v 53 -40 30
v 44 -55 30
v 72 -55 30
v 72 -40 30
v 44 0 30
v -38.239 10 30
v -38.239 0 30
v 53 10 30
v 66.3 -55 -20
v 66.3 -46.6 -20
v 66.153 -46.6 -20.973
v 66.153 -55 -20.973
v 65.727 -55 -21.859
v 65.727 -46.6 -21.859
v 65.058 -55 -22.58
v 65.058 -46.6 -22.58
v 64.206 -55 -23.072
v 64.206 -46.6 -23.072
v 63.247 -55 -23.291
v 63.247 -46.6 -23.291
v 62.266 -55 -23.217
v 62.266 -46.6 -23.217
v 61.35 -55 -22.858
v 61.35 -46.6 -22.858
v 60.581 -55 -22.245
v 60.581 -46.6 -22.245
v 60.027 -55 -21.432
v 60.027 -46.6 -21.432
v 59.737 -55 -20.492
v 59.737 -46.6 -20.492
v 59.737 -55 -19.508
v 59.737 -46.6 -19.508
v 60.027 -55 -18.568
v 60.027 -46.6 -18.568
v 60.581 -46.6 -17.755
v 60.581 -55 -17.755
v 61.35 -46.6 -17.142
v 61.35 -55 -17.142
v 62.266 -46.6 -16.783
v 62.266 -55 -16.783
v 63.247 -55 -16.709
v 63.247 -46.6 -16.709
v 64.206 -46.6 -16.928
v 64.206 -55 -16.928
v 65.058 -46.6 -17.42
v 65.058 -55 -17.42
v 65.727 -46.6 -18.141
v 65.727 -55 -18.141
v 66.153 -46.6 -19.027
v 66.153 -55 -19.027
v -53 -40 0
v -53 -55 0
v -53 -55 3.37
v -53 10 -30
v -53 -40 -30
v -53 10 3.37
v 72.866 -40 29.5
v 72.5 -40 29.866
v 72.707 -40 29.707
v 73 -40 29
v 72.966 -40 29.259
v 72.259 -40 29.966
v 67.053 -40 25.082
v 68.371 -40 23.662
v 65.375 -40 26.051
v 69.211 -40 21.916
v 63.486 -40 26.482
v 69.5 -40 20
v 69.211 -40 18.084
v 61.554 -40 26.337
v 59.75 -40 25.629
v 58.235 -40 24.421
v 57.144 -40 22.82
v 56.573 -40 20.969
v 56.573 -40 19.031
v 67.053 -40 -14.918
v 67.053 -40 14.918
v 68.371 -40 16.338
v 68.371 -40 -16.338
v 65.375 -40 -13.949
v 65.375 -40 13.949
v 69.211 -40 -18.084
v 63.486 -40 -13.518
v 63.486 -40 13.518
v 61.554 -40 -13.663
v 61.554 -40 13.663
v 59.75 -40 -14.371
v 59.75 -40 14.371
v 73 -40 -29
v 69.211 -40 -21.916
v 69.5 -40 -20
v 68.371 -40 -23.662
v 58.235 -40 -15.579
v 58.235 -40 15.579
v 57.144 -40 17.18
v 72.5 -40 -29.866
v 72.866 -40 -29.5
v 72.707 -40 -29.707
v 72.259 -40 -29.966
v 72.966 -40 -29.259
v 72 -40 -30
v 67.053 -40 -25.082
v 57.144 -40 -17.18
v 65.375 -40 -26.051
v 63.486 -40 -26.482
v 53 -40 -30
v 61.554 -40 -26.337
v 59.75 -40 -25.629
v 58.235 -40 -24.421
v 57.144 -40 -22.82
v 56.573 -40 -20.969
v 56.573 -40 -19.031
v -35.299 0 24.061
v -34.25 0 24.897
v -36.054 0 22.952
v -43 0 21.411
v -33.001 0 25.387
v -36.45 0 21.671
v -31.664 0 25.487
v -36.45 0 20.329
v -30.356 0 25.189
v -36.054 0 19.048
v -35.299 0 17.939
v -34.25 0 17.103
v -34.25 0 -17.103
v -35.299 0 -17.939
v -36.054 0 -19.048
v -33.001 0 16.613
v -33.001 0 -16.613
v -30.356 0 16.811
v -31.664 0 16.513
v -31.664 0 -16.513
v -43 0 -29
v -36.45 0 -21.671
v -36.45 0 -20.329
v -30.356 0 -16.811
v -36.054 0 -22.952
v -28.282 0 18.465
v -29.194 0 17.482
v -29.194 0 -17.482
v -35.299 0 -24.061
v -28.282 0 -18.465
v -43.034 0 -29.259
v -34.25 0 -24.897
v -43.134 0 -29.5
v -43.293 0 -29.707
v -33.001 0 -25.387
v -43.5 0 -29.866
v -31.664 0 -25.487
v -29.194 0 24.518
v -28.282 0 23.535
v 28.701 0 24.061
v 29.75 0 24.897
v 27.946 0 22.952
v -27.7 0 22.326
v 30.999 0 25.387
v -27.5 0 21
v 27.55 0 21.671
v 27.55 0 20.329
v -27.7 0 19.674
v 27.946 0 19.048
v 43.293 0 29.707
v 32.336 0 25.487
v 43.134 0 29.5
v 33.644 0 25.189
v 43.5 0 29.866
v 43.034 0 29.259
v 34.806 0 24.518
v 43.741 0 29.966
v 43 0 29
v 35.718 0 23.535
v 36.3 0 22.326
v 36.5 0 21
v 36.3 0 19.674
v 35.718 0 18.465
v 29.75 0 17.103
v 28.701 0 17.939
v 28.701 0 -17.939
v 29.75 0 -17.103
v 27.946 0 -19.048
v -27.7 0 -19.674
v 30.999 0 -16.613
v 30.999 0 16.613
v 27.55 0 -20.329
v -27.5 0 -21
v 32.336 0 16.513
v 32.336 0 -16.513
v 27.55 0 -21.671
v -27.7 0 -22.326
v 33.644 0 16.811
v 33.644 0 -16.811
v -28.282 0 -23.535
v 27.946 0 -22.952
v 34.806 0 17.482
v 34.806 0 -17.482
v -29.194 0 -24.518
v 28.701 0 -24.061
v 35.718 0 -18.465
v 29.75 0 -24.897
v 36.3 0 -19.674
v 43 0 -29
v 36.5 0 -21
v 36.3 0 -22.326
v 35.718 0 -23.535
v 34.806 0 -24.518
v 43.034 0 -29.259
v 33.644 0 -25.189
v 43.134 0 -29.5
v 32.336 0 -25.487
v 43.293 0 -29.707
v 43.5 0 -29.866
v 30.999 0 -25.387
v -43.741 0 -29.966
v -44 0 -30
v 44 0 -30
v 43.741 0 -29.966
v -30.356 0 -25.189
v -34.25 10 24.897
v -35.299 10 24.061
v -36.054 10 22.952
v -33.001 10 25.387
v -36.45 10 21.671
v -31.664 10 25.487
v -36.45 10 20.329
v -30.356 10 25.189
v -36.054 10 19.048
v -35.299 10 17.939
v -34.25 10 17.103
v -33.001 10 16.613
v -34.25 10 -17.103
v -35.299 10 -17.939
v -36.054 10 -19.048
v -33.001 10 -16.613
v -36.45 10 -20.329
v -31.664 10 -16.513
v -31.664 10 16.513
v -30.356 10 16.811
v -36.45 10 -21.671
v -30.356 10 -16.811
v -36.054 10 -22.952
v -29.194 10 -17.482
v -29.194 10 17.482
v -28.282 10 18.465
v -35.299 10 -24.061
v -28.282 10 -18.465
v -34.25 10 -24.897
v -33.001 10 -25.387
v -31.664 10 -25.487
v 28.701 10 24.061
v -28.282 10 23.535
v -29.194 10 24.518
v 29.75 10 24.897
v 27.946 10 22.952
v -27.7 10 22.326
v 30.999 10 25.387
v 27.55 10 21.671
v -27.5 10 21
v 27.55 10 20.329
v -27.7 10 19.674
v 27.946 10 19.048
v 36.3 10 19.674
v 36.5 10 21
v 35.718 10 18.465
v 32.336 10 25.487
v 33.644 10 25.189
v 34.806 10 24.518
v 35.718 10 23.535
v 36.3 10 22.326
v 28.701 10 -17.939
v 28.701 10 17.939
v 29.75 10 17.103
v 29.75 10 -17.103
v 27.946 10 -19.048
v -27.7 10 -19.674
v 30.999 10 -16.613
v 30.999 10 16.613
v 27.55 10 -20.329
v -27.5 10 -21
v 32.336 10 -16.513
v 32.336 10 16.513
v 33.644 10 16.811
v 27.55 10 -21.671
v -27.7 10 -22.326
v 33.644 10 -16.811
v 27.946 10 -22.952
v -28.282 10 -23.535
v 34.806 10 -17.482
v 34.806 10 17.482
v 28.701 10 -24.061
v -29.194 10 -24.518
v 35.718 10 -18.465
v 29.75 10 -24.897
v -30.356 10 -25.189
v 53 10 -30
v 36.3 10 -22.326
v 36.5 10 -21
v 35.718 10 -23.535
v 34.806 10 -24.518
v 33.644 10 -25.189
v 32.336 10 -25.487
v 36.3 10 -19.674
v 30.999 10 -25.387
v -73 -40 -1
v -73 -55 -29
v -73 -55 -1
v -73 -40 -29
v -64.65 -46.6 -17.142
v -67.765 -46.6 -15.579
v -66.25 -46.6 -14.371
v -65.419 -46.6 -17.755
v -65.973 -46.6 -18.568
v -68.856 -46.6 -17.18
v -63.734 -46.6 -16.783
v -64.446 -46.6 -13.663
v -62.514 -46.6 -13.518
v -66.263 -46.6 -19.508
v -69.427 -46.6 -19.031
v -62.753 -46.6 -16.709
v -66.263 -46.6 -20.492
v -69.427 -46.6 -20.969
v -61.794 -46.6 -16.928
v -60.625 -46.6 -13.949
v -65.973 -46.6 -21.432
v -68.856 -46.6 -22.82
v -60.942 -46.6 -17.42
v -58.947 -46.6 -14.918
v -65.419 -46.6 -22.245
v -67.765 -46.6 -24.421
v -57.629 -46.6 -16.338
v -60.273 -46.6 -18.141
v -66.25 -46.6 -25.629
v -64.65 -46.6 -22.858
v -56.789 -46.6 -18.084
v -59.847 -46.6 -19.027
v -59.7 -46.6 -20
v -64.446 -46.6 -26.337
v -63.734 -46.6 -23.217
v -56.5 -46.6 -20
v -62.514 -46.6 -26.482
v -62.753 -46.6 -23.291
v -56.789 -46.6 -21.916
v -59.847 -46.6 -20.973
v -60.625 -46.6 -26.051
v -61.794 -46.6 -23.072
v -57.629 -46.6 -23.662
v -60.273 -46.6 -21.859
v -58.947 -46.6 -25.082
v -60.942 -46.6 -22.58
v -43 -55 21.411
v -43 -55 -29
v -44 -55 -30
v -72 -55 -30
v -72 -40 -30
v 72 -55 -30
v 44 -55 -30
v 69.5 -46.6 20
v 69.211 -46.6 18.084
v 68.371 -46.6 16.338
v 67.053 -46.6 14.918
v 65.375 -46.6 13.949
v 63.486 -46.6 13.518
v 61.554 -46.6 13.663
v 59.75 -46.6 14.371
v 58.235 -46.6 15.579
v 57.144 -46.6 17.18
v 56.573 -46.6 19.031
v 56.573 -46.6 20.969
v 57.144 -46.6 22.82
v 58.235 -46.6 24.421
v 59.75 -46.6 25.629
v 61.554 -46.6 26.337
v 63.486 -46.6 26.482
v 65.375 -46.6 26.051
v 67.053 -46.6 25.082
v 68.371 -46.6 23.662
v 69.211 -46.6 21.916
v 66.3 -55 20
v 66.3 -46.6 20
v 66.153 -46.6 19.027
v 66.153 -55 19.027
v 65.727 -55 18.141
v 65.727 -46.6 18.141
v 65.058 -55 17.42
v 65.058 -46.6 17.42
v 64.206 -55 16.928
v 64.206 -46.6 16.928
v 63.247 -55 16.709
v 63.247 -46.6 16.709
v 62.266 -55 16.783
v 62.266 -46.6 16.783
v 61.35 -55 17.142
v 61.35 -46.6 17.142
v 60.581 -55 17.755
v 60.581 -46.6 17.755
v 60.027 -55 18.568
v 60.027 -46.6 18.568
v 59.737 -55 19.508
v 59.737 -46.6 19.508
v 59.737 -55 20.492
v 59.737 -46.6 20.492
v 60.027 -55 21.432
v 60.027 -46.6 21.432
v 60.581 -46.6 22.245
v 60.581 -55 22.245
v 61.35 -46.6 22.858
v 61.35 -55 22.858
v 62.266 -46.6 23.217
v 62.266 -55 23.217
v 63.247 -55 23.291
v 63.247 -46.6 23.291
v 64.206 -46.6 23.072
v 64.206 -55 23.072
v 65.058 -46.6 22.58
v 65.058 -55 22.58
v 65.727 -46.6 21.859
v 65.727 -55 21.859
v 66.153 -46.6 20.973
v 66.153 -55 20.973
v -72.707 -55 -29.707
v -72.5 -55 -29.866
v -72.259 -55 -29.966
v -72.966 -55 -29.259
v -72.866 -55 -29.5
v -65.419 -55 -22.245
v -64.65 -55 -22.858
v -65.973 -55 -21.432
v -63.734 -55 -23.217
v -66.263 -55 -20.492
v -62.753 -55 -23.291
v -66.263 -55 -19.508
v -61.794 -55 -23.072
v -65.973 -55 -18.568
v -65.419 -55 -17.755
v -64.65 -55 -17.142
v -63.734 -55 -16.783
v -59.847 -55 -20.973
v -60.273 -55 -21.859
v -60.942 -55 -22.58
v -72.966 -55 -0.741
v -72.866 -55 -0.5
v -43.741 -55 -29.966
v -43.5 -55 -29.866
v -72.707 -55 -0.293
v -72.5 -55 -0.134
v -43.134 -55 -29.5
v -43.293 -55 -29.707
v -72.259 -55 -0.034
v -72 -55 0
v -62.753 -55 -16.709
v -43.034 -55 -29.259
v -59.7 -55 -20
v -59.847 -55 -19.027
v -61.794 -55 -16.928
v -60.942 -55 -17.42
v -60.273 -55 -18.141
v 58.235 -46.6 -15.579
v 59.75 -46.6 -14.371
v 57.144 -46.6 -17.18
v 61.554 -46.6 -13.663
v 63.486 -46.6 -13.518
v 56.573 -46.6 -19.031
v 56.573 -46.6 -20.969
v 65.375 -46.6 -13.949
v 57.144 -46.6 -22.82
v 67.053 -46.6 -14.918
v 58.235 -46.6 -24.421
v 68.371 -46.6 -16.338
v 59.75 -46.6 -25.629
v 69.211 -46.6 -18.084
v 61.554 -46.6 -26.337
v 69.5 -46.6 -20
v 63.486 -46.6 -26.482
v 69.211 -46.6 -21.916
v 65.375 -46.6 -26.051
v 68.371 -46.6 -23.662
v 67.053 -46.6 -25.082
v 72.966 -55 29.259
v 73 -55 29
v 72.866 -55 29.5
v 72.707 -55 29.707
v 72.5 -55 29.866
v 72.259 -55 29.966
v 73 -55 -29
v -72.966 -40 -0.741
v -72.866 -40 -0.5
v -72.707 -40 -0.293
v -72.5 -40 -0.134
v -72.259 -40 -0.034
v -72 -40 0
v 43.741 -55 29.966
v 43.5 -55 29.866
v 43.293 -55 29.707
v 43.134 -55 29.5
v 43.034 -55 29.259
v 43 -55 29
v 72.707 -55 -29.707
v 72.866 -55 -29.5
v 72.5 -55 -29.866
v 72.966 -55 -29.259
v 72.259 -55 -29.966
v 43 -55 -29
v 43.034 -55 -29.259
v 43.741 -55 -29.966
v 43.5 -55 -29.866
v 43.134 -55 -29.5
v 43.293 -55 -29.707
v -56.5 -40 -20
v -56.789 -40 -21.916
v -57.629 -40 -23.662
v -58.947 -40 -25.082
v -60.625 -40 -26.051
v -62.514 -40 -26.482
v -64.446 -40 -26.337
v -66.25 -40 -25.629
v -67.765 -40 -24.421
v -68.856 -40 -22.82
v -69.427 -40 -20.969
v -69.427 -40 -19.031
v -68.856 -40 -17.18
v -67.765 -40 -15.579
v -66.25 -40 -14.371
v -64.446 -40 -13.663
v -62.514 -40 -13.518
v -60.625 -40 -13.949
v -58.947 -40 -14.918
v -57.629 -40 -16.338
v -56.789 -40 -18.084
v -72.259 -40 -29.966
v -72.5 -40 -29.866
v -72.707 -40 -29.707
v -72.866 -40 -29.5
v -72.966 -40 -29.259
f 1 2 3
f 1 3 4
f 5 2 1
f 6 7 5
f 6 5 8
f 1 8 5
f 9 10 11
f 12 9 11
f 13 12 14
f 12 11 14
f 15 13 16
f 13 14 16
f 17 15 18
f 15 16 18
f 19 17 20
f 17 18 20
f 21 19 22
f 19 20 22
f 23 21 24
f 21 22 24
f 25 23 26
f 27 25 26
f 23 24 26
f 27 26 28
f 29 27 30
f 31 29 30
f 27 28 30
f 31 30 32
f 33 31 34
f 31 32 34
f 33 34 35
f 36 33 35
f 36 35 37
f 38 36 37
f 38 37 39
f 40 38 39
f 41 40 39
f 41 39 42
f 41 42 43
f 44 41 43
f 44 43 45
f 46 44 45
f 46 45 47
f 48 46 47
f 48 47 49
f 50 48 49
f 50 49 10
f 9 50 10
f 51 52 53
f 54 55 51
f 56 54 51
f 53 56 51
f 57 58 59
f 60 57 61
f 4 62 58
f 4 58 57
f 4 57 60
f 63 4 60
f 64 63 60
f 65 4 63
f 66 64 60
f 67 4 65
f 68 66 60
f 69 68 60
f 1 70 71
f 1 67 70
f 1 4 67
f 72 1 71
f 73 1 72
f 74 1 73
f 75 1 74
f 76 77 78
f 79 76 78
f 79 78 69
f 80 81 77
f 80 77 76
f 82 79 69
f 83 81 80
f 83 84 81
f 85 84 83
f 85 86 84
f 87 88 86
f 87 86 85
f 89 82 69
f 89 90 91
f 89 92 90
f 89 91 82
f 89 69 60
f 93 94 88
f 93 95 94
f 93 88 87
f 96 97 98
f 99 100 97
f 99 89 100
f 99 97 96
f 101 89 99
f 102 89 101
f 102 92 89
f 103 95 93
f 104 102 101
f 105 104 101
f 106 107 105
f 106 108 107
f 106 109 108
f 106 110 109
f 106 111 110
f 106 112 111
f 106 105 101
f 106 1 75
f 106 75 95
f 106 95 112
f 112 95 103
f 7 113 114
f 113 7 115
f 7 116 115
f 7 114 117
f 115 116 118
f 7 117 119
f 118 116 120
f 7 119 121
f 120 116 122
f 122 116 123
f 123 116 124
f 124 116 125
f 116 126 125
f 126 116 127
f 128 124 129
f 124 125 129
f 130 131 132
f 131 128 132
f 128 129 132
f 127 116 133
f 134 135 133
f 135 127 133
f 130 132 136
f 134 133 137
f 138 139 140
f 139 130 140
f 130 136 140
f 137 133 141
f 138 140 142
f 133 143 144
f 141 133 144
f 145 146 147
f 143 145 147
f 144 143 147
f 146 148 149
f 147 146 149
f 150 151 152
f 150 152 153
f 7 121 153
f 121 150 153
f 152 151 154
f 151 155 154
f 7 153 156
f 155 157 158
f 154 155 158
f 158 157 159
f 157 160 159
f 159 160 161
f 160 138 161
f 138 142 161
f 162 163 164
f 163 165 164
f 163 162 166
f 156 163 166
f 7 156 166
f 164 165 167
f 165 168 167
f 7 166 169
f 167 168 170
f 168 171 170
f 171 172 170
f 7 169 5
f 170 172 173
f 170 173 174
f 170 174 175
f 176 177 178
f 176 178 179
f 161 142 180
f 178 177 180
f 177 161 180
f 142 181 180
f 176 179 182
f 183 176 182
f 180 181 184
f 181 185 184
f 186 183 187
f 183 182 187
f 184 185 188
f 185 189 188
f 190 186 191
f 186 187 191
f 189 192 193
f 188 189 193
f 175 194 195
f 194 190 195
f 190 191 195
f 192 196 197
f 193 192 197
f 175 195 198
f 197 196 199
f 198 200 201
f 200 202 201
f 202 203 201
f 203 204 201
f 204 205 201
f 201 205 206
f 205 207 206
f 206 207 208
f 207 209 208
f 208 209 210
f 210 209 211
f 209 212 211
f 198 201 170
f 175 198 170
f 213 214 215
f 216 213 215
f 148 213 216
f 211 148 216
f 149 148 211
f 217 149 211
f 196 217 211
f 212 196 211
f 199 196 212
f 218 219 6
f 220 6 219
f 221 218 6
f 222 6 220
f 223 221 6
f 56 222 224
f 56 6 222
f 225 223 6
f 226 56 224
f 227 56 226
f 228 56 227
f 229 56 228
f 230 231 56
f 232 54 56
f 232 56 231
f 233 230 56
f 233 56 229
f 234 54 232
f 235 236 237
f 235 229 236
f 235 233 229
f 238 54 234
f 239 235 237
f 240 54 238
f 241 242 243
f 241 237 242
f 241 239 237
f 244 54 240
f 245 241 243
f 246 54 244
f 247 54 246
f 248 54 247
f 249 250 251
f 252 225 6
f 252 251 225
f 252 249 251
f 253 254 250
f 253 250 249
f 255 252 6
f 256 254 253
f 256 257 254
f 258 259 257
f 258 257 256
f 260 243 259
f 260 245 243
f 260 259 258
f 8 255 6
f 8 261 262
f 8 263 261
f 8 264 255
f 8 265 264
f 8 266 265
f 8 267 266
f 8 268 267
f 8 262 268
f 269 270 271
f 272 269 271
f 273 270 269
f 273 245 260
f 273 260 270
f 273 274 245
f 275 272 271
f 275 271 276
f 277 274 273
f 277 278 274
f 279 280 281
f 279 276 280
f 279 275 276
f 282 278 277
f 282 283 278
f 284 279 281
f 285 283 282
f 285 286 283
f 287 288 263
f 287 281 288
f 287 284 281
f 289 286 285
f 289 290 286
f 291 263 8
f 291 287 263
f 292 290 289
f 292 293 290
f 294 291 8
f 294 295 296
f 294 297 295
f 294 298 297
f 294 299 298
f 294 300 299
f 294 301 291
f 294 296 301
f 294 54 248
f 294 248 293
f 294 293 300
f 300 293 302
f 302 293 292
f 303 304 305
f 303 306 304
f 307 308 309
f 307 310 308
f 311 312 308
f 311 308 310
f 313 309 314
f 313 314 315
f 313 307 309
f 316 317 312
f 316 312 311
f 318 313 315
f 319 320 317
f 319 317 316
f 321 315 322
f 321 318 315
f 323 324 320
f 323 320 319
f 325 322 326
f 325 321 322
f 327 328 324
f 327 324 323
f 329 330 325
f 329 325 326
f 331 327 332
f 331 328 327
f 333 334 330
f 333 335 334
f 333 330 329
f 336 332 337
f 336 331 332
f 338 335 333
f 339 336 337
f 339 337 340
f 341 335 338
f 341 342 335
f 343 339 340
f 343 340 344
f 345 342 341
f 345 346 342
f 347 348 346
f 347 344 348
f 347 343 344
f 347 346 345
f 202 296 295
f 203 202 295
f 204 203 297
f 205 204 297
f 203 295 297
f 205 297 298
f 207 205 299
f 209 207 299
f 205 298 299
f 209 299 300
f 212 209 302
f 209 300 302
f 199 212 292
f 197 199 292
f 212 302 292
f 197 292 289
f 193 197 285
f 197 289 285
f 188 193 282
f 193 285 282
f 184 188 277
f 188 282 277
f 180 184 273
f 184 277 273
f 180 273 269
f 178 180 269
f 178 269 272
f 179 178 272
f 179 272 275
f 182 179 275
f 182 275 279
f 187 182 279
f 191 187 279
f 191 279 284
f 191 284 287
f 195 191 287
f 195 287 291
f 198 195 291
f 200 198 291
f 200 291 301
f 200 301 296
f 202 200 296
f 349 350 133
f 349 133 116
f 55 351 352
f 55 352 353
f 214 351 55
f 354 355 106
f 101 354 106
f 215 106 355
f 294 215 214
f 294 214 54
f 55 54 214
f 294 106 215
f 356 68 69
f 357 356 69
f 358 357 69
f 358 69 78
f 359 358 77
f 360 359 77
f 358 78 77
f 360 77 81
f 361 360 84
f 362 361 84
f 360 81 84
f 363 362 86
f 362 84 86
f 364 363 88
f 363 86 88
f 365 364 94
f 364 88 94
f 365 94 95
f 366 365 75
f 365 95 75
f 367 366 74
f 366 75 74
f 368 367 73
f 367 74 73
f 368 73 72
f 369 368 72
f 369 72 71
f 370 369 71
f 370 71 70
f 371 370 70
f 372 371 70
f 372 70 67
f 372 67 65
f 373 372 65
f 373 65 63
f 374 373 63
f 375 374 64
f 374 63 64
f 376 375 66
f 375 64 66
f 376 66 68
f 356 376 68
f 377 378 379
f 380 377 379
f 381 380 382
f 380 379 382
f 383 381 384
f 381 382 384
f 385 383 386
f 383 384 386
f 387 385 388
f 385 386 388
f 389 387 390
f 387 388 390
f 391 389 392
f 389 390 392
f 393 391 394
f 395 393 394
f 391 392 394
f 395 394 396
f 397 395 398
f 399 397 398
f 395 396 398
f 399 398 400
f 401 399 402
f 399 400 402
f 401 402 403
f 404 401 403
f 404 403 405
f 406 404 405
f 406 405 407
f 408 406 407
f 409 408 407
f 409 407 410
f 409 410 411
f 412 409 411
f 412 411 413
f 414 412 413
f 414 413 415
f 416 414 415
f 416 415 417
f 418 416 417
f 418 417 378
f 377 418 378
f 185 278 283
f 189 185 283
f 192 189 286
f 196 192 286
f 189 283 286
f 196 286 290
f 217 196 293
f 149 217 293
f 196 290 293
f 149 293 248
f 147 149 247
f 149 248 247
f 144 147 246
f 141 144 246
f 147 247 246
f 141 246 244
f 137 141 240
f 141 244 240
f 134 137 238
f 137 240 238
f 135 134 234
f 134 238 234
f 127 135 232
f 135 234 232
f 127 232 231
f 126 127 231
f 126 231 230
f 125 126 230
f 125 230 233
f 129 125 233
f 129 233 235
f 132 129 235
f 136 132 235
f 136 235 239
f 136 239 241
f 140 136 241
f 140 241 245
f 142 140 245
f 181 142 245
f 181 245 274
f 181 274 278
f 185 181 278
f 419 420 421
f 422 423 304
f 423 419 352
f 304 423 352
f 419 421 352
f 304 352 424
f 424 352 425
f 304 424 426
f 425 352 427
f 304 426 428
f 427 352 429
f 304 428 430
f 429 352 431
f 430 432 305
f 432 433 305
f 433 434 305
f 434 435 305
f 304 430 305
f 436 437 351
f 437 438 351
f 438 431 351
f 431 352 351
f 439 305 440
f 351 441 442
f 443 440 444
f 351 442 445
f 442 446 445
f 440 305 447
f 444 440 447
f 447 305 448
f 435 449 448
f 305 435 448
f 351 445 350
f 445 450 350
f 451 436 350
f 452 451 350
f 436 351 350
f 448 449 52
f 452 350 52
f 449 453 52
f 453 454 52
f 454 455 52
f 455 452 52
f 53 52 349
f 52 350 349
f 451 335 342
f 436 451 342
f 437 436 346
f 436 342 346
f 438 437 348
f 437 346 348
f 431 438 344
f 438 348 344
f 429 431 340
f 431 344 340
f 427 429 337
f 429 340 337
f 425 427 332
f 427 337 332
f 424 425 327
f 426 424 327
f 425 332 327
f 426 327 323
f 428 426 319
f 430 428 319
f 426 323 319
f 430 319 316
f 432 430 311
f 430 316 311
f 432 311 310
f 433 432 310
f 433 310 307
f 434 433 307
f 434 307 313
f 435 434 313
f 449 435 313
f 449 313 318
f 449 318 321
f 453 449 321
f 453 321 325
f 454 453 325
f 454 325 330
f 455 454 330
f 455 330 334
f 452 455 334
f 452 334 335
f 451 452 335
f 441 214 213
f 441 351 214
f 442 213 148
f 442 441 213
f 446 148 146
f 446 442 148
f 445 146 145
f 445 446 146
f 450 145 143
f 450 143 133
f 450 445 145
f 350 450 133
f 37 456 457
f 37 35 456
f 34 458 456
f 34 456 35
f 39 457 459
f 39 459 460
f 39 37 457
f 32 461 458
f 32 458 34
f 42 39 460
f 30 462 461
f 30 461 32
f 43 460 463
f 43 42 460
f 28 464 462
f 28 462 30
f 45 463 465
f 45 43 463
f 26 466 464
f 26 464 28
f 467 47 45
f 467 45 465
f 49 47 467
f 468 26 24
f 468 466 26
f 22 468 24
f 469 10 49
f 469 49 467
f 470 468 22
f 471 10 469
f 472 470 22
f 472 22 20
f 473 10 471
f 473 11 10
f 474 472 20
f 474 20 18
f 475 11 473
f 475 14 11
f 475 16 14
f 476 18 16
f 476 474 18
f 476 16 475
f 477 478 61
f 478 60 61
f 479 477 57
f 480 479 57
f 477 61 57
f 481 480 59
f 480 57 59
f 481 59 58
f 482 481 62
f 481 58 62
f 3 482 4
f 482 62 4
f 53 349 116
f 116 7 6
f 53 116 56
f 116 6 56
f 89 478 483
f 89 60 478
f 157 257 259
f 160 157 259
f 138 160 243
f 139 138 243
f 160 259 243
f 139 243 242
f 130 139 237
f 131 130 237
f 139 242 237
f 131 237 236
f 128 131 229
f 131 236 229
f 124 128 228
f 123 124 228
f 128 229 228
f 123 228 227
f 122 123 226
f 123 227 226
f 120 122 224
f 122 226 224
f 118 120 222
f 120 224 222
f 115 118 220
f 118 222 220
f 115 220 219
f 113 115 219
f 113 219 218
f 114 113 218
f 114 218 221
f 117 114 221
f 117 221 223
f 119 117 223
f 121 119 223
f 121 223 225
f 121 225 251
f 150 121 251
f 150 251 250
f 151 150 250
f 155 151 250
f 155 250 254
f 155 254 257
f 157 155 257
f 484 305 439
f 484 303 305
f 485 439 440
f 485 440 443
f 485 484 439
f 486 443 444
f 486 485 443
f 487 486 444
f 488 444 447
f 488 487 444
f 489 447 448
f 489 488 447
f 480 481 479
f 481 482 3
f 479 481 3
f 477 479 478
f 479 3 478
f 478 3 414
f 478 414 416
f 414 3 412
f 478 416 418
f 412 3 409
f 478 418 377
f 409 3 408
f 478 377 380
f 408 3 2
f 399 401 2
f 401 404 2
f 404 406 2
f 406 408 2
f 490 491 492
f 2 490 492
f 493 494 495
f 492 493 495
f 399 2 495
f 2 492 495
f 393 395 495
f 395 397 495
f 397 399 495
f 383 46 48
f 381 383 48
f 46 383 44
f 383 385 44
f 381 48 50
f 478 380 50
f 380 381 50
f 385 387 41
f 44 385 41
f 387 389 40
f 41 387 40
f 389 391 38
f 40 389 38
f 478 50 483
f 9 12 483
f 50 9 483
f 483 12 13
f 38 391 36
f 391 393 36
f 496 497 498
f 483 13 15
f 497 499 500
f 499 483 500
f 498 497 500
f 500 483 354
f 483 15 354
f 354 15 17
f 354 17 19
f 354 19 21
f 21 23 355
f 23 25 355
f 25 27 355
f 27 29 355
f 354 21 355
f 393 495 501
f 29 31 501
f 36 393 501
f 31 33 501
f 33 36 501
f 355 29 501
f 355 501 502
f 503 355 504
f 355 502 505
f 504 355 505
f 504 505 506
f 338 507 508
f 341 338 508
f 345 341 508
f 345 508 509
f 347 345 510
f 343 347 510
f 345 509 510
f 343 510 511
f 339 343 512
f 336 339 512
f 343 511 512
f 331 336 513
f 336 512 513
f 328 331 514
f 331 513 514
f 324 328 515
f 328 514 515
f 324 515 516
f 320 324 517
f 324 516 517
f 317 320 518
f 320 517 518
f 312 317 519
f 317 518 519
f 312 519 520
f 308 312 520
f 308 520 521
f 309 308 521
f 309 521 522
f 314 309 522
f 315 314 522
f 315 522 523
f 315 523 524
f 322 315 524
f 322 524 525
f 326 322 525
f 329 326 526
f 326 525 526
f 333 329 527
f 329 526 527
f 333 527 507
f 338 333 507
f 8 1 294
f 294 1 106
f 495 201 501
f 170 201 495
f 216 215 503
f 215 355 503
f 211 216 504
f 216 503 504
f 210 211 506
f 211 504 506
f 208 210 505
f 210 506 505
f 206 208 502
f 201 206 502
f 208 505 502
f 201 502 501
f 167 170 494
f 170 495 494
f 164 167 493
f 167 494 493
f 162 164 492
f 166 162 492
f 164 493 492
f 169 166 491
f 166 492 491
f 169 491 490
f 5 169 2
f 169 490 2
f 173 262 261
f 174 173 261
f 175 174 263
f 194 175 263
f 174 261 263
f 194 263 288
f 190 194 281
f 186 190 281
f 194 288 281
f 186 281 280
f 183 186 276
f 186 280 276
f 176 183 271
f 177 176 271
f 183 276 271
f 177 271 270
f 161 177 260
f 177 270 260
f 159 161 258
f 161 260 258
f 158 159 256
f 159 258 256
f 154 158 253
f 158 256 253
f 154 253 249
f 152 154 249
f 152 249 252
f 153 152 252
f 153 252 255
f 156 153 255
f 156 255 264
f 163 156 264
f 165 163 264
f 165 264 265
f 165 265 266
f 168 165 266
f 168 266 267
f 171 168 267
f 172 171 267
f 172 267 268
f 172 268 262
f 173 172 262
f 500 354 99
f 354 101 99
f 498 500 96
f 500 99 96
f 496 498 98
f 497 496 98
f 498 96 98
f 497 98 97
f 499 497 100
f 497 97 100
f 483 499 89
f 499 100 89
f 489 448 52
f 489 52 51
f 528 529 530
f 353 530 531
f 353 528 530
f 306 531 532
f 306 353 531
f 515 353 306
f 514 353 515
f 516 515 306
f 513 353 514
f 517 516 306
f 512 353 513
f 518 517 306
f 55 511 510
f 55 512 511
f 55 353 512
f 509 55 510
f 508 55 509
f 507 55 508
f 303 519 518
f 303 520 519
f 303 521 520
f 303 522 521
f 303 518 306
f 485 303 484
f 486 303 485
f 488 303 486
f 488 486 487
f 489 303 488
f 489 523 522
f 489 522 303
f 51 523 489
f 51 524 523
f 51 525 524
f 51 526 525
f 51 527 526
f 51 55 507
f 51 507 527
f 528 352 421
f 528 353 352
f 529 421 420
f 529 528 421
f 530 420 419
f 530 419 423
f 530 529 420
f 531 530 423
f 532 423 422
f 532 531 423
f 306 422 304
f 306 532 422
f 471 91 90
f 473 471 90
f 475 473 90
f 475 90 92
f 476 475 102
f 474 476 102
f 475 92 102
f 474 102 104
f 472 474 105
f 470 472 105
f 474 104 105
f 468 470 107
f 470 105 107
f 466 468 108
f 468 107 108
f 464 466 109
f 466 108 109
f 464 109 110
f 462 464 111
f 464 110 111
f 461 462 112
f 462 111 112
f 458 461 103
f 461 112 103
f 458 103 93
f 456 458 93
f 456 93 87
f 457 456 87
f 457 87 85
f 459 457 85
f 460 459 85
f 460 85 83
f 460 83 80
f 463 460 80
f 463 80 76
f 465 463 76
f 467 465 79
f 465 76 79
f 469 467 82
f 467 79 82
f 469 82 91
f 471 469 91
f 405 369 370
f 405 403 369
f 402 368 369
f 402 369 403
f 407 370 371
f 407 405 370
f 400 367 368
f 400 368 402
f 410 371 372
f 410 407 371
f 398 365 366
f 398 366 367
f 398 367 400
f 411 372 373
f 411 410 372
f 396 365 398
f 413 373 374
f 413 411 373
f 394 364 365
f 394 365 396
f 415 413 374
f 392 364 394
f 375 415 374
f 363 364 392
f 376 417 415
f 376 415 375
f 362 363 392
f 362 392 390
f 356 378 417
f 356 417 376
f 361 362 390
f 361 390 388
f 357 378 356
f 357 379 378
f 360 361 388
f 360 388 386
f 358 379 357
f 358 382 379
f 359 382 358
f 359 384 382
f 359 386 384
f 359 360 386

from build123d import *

# Parameters (mm, degrees)
SKETCH1_W           = 106
SKETCH1_H           = 60
BOSS_EXTRUDE1_DEPTH = 10
SKETCH2_W           = 10
SKETCH2_H           = 60
BOSS_EXTRUDE2_DEPTH = 55
SKETCH3_W           = 60
SKETCH3_H           = 15
BOSS_EXTRUDE3_DEPTH = 20
SKETCH4_W           = 30
SKETCH4_H           = 15
BOSS_EXTRUDE4_DEPTH = 20
SKETCH5_R           = 4.5
CUT_EXTRUDE1_DEPTH  = 66
SKETCH6_R           = 6.5
CUT_EXTRUDE2_DEPTH  = 6.6
SKETCH7_R           = 3.3
CUT_EXTRUDE3_DEPTH  = 9.4
CUT_EXTRUDE4_DEPTH  = 66
FILLET1_R           = 1


with BuildPart() as part:
    # Sketch1 → Boss-Extrude1 (new body)
    with BuildSketch(Plane(origin=(0, 0, 0), x_dir=(1, 0, 0), z_dir=(0, 1, 0))):
        Rectangle(SKETCH1_W, SKETCH1_H)
    extrude(amount=BOSS_EXTRUDE1_DEPTH)

    # Sketch2 → Boss-Extrude2 (add)
    with BuildSketch(Plane.XZ):
        with Locations((-48, 0)):
            Rectangle(SKETCH2_W, SKETCH2_H)
        with Locations((48, 0)):
            Rectangle(SKETCH2_W, SKETCH2_H)
    extrude(amount=BOSS_EXTRUDE2_DEPTH)

    # Sketch3 → Boss-Extrude3 (add)
    with BuildSketch(Plane(origin=(53, 0, 0), x_dir=(0, 0, -1), z_dir=(1, 0, 0))):
        with Locations((0, -47.5)):
            Rectangle(SKETCH3_W, SKETCH3_H)
    extrude(amount=BOSS_EXTRUDE3_DEPTH)

    # Sketch4 → Boss-Extrude4 (add)
    with BuildSketch(Plane.ZY.offset(53)):
        with Locations((-15, -47.5)):
            Rectangle(SKETCH4_W, SKETCH4_H)
    extrude(amount=BOSS_EXTRUDE4_DEPTH)

    # Sketch5 → Cut-Extrude1 (cut, through all)
    with BuildSketch(Plane(origin=(0, 10, 0), x_dir=(1, 0, 0), z_dir=(0, 1, 0))):
        with Locations((-32, 21)):
            Circle(SKETCH5_R)
        with Locations((32, 21)):
            Circle(SKETCH5_R)
        with Locations((32, -21)):
            Circle(SKETCH5_R)
        with Locations((-32, -21)):
            Circle(SKETCH5_R)
    extrude(amount=-CUT_EXTRUDE1_DEPTH, mode=Mode.SUBTRACT)

    # Sketch6 → Cut-Extrude2 (cut)
    with BuildSketch(Plane(origin=(0, -40, 0), x_dir=(1, 0, 0), z_dir=(0, 1, 0))):
        with Locations((63, 20)):
            Circle(SKETCH6_R)
        with Locations((63, -20)):
            Circle(SKETCH6_R)
        with Locations((-63, 20)):
            Circle(SKETCH6_R)
    extrude(amount=-CUT_EXTRUDE2_DEPTH, mode=Mode.SUBTRACT)

    # Sketch7 → Cut-Extrude3 (cut, through all)
    with BuildSketch(Plane(origin=(0, -46.6, 0), x_dir=(1, 0, 0), z_dir=(0, 1, 0))):
        with Locations((-63, 20)):
            Circle(SKETCH7_R)
        with Locations((63, -20)):
            Circle(SKETCH7_R)
        with Locations((63, 20)):
            Circle(SKETCH7_R)
    extrude(amount=-CUT_EXTRUDE3_DEPTH, mode=Mode.SUBTRACT)

    # Sketch8 → Cut-Extrude4 (cut, through all)
    with BuildSketch(Plane(origin=(0, 10, 0), x_dir=(1, 0, 0), z_dir=(0, 1, 0))):
        Polygon((-38.239, -30), (-53, -3.370451084), (-53, -30), align=None)
    extrude(amount=-CUT_EXTRUDE4_DEPTH, mode=Mode.SUBTRACT)

    # Fillet1
    fillet1_edges = [part.edges().sort_by_distance(p)[0] for p in [
        (-43, -27.5, -30),
        (43, -27.5, 30),
        (43, -27.5, -30),
        (73, -47.5, 30),
        (73, -47.5, -30),
        (-73, -47.5, -30),
        (-73, -47.5, 0),
    ]]
    fillet(fillet1_edges, radius=FILLET1_R)


solid = part.part
